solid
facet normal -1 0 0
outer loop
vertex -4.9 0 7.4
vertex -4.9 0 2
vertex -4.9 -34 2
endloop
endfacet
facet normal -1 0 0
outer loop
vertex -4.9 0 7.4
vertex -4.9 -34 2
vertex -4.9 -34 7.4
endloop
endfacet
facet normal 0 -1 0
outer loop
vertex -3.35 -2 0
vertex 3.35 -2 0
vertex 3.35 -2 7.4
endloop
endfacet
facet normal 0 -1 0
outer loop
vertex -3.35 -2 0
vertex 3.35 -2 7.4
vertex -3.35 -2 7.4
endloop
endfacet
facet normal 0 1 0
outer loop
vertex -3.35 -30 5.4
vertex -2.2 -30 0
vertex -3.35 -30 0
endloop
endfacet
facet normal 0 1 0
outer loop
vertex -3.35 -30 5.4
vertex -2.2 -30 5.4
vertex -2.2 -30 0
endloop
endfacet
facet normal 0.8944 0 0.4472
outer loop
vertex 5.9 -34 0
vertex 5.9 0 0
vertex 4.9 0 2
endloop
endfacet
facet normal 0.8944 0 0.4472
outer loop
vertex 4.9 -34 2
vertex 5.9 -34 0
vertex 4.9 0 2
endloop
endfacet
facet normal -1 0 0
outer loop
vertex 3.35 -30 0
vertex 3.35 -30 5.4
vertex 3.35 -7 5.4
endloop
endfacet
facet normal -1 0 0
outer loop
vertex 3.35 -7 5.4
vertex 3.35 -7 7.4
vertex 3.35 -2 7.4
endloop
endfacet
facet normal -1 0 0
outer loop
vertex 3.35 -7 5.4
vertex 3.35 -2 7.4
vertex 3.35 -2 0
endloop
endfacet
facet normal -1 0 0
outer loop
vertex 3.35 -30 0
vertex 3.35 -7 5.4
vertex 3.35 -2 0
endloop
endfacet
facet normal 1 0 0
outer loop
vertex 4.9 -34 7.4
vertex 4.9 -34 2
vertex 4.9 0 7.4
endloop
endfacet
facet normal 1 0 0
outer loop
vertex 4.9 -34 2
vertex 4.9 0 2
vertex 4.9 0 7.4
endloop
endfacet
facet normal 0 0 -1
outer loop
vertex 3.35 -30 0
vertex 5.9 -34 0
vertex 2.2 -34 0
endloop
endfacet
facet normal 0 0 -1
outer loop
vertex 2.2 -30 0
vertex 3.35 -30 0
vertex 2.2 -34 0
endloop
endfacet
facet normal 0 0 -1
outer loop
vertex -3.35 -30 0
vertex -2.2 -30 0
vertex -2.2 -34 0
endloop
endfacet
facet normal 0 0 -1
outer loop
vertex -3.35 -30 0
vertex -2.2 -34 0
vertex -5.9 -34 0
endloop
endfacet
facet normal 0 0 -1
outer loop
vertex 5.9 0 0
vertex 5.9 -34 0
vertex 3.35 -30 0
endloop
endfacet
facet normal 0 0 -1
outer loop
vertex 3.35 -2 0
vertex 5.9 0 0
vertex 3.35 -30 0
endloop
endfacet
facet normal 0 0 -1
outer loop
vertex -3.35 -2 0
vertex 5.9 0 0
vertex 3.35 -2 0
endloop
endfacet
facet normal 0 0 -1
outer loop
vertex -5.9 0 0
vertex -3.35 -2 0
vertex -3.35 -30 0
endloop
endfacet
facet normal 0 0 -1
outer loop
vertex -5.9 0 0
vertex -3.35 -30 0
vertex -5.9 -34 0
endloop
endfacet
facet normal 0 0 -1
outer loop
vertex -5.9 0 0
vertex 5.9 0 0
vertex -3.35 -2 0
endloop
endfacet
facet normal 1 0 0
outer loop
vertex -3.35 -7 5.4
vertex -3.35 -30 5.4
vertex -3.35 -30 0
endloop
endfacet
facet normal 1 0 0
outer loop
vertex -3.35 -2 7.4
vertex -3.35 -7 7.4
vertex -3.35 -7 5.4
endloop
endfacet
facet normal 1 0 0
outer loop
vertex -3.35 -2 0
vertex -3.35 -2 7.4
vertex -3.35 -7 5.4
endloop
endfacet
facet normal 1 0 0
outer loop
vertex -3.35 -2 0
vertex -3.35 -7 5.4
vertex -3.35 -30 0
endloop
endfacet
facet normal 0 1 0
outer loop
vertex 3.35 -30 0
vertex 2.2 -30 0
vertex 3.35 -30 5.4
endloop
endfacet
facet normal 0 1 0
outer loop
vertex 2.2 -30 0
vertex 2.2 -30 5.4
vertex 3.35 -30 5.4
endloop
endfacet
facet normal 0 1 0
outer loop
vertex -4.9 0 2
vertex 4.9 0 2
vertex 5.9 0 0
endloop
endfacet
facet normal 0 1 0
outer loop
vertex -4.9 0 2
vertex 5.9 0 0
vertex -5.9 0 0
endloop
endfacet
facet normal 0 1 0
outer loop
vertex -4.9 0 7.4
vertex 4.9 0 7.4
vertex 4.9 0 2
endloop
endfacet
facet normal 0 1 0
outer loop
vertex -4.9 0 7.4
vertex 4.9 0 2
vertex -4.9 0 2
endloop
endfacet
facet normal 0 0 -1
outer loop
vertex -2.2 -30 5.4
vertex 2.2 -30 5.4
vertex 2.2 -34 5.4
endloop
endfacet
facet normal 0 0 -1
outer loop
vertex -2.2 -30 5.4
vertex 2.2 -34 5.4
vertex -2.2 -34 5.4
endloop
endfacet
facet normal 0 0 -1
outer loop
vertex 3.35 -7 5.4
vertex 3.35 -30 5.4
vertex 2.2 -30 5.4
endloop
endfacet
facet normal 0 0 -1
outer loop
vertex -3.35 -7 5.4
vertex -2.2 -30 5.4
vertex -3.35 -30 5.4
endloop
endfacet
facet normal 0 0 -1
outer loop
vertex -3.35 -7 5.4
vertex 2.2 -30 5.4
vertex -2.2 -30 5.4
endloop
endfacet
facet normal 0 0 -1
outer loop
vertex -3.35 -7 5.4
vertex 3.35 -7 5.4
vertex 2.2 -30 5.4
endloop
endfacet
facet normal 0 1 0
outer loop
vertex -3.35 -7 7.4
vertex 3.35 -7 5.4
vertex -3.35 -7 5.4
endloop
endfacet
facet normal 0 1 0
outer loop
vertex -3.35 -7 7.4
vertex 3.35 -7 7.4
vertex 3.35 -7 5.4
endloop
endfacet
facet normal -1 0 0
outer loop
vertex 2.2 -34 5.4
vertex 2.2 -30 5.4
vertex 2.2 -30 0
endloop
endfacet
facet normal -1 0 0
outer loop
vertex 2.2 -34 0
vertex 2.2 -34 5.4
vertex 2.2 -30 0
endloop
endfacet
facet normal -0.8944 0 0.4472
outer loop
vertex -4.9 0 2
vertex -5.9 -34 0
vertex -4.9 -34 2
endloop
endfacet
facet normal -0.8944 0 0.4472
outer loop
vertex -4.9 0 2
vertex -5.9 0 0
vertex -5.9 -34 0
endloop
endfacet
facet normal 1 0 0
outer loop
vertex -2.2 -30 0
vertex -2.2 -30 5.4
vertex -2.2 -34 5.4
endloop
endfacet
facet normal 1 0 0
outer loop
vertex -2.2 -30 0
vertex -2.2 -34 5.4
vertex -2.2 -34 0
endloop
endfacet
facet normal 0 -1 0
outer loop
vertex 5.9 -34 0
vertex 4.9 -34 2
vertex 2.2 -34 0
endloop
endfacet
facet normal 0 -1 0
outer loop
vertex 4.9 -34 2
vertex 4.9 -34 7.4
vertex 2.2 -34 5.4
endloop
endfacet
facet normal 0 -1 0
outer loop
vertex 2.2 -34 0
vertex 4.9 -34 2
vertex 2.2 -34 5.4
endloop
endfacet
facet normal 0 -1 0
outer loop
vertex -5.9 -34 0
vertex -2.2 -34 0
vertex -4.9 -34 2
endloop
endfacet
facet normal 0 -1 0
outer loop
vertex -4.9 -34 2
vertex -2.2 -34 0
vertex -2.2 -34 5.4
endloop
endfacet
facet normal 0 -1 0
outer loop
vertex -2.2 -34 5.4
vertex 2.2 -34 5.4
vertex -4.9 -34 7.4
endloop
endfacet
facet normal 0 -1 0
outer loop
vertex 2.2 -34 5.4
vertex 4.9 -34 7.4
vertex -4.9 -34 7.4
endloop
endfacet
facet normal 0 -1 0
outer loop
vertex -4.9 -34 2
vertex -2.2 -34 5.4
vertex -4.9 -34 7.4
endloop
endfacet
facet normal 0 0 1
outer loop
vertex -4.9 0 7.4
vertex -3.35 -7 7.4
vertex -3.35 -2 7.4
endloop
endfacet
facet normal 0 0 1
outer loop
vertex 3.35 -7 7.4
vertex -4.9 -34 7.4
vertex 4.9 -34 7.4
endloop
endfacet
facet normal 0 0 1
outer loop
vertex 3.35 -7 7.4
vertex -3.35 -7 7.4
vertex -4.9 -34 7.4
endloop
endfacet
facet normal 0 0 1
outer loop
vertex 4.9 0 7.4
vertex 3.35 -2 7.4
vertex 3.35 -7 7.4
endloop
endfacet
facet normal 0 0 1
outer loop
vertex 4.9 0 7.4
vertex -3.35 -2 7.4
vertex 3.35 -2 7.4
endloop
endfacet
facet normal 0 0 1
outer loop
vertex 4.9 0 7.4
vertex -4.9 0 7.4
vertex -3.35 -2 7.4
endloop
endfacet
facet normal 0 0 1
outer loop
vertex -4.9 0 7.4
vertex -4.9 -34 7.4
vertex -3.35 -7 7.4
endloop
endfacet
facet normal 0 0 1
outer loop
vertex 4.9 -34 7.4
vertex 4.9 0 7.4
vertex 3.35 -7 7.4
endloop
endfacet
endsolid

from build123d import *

# Parameters (mm, degrees)
PAD_DEPTH    = 2
PAD001_DEPTH = 5
PAD002_DEPTH = 23
PAD003_DEPTH = 4


with BuildPart() as part:
    # Sketch → Pad (new body)
    with BuildSketch(Plane.XZ):
        Polygon((5.9, 0), (4.9, 2), (4.9, 7.4), (0, 7.4), (0, 0), align=None)
    pad = extrude(amount=PAD_DEPTH)

    # Sketch001 → Pad001 (join)
    with BuildSketch(Plane.XZ.offset(2)):
        Polygon((5.9, 0), (4.9, 2), (4.9, 7.4), (3.35, 7.4), (3.35, 0), align=None)
    pad001 = extrude(amount=PAD001_DEPTH)

    # Sketch002 → Pad002 (join)
    with BuildSketch(Plane.XZ.offset(7)):
        Polygon((5.9, 0), (4.9, 2), (4.9, 7.4), (0, 7.4), (0, 5.4), (3.35, 5.4), (3.35, 0), align=None)
    pad002 = extrude(amount=PAD002_DEPTH)

    # Sketch003 → Pad003 (join)
    with BuildSketch(Plane.XZ.offset(30)):
        Polygon((5.9, 0), (4.9, 2), (4.9, 7.4), (0, 7.4), (0, 5.4), (2.2, 5.4), (2.2, 0), (3.35, 0), align=None)
    pad003 = extrude(amount=PAD003_DEPTH)

    # Mirrored: Pad, Pad001, Pad002, Pad003 across Sketch V_Axis
    add(pad.mirror(Plane(origin=(0, 0, 0), x_dir=(0, -1, 0), z_dir=(1, 0, 0))))
    add(pad001.mirror(Plane(origin=(0, 0, 0), x_dir=(0, -1, 0), z_dir=(1, 0, 0))))
    add(pad002.mirror(Plane(origin=(0, 0, 0), x_dir=(0, -1, 0), z_dir=(1, 0, 0))))
    add(pad003.mirror(Plane(origin=(0, 0, 0), x_dir=(0, -1, 0), z_dir=(1, 0, 0))))


solid = part.part
